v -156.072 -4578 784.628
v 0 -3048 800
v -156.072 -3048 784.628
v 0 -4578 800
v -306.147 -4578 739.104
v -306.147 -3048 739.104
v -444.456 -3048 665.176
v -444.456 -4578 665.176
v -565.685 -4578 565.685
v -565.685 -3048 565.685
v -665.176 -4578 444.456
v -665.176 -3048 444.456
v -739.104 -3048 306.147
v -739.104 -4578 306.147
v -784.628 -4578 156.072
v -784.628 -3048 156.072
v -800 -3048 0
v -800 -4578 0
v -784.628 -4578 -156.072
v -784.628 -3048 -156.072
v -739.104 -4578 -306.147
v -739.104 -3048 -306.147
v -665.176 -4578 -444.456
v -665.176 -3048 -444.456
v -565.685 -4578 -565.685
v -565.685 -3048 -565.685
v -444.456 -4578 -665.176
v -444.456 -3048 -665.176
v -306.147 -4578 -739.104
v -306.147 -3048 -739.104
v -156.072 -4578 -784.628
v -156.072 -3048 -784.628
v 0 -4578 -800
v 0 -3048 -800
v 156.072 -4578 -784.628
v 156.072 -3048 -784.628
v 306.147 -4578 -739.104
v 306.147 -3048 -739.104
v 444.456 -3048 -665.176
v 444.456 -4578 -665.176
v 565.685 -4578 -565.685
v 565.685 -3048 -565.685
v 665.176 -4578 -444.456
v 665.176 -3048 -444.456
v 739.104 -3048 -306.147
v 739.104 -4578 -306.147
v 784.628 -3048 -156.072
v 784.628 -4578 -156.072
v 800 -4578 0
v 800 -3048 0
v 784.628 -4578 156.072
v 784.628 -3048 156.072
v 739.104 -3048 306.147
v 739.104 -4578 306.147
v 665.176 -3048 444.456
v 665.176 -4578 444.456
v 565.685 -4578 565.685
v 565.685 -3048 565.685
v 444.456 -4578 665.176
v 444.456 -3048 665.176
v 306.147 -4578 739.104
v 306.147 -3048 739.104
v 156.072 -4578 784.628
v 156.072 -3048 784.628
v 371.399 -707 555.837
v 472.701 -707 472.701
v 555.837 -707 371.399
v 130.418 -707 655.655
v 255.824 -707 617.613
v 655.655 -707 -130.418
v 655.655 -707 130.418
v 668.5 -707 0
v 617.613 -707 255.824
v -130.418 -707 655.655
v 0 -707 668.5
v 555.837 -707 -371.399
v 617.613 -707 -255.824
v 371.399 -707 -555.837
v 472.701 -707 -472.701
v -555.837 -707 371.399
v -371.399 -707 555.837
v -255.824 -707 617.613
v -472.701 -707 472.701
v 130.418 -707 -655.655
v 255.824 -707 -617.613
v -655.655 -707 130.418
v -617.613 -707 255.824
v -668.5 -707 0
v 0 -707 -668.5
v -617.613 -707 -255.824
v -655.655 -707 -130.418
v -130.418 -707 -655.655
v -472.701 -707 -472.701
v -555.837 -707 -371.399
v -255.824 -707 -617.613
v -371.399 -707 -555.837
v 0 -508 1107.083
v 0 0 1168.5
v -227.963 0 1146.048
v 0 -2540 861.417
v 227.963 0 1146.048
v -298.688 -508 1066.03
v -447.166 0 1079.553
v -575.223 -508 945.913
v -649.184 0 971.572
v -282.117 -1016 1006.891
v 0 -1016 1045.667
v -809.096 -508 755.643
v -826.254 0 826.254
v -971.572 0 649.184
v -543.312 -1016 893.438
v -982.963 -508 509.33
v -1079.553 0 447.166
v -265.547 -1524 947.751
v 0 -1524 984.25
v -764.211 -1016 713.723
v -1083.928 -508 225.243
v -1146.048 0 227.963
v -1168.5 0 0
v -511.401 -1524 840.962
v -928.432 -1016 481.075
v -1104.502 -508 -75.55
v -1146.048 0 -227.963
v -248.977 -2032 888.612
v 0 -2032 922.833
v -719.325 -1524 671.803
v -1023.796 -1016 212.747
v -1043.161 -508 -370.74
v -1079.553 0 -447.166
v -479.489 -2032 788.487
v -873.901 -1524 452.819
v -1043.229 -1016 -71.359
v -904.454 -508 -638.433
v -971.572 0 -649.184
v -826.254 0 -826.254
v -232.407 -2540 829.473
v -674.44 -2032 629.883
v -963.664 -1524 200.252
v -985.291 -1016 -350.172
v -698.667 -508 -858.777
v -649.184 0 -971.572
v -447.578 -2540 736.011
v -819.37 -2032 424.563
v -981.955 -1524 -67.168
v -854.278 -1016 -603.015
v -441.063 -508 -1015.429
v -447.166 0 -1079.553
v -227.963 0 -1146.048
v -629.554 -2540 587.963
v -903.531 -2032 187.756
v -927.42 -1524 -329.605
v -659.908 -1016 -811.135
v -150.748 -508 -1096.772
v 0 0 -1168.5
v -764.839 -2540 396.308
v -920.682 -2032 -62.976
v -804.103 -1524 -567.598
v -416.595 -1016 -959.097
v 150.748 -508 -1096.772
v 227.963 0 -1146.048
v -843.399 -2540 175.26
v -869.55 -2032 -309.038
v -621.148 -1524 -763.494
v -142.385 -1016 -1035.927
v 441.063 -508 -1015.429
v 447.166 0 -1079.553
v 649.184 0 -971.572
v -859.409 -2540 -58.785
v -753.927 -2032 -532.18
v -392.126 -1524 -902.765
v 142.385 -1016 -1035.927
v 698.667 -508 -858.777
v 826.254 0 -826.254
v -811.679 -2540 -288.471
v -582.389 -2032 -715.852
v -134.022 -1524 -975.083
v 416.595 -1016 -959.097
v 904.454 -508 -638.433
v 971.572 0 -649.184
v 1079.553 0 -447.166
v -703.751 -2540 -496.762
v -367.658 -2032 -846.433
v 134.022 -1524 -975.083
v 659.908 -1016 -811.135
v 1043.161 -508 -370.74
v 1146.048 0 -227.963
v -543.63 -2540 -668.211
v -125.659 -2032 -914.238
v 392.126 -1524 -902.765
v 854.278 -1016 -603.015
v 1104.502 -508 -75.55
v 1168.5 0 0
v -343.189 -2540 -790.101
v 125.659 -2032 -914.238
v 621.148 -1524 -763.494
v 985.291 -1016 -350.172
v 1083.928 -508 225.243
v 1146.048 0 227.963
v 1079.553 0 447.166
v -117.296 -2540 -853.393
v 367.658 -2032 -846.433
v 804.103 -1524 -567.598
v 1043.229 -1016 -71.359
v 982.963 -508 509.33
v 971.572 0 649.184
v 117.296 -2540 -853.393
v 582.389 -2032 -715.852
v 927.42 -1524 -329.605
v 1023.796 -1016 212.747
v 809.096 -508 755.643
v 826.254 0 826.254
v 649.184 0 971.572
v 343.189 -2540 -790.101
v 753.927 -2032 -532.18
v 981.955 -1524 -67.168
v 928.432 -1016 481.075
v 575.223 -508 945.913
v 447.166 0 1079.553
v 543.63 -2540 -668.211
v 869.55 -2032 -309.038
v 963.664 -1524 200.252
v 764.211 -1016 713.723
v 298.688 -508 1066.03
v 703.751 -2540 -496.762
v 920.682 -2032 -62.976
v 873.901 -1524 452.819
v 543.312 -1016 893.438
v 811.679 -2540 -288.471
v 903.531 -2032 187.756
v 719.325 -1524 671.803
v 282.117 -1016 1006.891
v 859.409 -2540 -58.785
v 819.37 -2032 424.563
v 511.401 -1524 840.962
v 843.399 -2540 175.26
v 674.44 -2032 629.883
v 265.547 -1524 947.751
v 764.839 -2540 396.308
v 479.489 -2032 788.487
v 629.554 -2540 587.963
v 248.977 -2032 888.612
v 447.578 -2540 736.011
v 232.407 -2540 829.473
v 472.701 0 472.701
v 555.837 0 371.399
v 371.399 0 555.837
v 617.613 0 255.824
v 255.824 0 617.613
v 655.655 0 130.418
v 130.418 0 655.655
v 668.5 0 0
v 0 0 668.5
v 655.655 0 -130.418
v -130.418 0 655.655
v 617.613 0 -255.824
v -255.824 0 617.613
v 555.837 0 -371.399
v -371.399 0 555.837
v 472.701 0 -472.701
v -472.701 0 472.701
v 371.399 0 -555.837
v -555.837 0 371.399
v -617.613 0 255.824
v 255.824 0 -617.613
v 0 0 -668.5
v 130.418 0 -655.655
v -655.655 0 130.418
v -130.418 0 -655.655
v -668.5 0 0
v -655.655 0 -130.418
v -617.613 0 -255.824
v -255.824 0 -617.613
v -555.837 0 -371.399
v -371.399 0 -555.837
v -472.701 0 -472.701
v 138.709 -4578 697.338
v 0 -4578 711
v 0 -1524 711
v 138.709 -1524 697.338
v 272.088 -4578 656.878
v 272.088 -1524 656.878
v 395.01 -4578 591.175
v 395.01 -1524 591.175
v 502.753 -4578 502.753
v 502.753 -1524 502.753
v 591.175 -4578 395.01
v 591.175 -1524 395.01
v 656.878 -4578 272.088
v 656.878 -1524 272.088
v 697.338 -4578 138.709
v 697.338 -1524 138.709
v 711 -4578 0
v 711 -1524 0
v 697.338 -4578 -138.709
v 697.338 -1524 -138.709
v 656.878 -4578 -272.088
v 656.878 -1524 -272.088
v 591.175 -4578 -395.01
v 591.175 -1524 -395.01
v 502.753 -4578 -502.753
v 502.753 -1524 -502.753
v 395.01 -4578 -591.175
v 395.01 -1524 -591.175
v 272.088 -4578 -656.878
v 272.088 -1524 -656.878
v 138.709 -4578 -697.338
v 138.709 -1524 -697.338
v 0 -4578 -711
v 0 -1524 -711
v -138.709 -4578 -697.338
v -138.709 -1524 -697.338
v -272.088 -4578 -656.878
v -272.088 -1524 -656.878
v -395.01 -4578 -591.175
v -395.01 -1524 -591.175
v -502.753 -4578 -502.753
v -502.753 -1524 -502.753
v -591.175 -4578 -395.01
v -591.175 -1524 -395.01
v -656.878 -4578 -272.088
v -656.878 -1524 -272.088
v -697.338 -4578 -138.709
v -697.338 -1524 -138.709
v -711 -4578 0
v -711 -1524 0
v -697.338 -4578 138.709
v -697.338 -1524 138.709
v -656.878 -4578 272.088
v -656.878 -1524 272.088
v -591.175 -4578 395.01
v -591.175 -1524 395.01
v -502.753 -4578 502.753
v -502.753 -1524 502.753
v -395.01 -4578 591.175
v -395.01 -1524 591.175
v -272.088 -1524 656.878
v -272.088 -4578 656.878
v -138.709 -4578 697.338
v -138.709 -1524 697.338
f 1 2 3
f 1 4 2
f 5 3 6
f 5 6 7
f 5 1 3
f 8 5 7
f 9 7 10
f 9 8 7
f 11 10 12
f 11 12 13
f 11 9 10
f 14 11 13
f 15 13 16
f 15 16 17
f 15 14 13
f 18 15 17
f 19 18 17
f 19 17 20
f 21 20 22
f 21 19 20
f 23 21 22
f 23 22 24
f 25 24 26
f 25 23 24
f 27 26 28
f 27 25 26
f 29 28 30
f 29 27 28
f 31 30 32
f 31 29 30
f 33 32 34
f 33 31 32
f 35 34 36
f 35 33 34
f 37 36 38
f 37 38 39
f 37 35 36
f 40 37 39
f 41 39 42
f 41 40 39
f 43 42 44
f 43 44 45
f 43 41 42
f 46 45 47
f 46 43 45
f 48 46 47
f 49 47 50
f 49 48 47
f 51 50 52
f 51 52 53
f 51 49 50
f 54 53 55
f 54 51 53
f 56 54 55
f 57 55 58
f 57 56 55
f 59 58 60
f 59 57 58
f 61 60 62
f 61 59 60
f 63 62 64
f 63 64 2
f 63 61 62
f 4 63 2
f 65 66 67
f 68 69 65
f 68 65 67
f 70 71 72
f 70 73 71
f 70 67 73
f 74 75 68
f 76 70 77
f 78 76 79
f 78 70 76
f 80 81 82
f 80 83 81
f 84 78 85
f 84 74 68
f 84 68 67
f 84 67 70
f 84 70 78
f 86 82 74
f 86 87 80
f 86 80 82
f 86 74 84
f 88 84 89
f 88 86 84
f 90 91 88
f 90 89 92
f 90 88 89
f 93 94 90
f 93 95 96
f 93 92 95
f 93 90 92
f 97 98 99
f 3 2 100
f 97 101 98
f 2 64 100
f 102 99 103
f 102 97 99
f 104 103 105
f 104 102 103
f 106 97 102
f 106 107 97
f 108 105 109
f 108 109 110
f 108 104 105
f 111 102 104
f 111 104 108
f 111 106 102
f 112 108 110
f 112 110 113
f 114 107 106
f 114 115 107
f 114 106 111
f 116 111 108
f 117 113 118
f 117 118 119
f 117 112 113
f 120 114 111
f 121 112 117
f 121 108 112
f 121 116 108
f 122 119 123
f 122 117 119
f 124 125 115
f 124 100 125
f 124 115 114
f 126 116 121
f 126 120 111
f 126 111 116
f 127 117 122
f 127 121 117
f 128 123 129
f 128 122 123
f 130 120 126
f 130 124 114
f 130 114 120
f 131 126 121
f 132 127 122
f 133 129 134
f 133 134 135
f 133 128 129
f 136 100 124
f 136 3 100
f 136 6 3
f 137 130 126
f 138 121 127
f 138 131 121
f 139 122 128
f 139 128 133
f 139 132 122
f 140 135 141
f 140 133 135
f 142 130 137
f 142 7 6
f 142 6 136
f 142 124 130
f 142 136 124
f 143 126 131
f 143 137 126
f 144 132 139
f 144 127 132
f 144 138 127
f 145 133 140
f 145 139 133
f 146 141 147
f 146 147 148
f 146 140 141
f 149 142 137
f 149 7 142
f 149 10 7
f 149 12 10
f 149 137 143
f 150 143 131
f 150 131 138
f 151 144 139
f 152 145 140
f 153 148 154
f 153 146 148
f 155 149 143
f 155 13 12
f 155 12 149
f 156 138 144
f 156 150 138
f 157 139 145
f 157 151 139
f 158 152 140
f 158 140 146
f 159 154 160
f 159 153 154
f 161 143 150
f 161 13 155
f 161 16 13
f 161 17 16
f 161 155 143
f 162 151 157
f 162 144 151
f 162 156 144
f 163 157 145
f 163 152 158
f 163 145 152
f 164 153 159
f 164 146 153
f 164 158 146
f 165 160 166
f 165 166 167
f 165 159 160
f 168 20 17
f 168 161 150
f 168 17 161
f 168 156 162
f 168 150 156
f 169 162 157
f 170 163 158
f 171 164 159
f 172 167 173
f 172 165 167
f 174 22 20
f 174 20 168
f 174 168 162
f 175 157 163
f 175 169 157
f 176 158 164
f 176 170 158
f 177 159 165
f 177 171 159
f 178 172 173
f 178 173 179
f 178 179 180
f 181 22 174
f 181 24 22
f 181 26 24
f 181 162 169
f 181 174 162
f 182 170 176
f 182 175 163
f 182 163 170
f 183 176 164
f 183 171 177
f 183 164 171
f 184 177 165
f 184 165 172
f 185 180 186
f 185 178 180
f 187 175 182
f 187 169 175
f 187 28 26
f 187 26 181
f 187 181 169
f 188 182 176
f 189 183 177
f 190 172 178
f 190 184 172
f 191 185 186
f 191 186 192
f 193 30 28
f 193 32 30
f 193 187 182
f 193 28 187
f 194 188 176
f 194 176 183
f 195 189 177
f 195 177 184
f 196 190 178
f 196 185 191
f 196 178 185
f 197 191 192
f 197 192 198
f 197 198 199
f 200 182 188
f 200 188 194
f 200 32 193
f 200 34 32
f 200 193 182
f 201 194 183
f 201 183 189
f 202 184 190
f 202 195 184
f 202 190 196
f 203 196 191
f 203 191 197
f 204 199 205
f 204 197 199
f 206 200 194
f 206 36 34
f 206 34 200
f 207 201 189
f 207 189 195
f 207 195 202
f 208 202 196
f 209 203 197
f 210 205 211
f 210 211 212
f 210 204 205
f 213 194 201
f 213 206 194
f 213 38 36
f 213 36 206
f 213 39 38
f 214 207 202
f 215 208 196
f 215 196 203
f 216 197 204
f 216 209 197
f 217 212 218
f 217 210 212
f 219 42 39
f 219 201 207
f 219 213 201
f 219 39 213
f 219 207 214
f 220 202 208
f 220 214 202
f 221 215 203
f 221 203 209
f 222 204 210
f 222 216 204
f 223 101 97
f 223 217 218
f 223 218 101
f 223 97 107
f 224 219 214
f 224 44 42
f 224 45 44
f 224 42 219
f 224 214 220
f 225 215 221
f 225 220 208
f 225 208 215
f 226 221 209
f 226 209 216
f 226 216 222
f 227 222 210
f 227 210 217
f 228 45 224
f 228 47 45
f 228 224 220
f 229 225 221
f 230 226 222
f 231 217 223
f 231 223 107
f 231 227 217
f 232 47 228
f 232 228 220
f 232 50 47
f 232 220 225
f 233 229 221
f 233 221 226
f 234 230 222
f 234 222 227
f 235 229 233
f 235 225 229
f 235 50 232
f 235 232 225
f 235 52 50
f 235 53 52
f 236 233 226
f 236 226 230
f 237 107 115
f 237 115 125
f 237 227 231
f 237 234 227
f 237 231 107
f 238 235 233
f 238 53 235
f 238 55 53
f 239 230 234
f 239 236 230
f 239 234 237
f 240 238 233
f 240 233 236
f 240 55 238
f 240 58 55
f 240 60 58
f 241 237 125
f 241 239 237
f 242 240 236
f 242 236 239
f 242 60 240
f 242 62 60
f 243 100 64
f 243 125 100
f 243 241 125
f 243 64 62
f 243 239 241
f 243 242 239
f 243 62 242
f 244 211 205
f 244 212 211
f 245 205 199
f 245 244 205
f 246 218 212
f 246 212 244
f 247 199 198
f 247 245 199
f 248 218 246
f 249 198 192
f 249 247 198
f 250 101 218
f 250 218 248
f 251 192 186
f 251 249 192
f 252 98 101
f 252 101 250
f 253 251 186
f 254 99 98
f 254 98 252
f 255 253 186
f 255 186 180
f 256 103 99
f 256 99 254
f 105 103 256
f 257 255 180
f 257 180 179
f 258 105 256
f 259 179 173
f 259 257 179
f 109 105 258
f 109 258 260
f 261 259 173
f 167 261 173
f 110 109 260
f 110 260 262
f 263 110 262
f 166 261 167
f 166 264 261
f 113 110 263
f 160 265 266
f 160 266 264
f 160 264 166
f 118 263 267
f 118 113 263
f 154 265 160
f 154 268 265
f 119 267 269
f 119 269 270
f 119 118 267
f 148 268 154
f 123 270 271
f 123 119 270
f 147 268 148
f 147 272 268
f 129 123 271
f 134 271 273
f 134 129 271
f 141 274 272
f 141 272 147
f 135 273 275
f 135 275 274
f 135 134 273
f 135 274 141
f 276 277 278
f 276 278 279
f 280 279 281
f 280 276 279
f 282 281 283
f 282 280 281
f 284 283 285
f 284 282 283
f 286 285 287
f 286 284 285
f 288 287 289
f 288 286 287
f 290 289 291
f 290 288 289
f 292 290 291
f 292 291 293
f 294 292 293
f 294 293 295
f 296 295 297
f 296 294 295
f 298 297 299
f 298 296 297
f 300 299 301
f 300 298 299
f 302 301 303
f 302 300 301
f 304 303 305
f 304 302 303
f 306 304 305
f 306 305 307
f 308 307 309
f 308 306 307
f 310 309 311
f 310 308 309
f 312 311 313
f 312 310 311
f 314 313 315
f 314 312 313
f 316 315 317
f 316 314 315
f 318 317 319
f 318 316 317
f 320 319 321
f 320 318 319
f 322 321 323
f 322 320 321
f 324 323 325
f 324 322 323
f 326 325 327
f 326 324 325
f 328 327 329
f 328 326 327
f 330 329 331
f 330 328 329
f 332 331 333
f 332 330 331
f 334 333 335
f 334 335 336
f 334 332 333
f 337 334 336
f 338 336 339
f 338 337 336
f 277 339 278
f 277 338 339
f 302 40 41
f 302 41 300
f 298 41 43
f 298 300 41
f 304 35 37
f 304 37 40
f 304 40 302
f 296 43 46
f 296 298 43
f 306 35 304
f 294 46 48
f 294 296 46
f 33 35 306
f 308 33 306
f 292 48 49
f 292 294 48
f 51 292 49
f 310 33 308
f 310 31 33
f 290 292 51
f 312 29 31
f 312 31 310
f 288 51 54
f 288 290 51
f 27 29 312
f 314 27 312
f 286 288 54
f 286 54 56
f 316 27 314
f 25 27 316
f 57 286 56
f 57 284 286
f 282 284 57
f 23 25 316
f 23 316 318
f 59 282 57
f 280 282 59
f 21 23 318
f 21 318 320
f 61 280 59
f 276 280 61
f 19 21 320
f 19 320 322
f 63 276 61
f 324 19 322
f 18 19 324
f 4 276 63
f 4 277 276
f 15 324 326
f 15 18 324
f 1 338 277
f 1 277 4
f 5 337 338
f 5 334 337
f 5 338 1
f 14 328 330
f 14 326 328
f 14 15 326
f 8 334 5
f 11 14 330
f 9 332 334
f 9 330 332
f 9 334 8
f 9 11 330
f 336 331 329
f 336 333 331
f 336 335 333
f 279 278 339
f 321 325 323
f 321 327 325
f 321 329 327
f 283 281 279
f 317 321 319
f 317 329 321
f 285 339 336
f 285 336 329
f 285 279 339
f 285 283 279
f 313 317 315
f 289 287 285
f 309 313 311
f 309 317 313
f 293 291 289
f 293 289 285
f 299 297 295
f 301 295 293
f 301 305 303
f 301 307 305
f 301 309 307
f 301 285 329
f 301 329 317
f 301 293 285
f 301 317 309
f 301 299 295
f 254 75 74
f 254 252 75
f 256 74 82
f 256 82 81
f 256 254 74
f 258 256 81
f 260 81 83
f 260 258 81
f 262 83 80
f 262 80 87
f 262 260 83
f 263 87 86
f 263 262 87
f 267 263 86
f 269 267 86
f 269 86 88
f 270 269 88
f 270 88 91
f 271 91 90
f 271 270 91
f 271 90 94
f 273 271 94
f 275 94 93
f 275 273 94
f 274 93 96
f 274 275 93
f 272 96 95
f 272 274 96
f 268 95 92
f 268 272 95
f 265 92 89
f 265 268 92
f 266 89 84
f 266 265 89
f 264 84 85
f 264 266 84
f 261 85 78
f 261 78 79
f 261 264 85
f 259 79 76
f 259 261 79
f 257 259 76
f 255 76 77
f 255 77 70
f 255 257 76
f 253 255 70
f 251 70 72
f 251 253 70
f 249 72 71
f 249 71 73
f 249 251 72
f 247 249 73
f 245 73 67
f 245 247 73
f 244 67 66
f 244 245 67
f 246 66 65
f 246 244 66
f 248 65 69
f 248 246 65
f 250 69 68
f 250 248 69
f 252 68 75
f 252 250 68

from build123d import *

# Parameters (mm, degrees)
F2_W = 707
F2_H = 668.5


with BuildPart() as f3:
    # F0 (on Right) → F3 (revolve)
    with BuildSketch(Plane.YZ):
        Polygon((-3048, 0), (0, 0), (0, 1168.5), (-3048, 800), (-4578, 800), (-4578, 0), align=None)
    revolve(axis=Axis((0, -1524, 0), (0, -1, 0)))

    # F1 (on face) → F4 (revolve, cut)
    with BuildSketch(Plane.YZ):
        Polygon((-4810.84156, 0), (-3048, 0), (-1524, 0), (-1524, 711), (-3048, 711), (-4816.081524, 711), align=None)
    revolve(axis=Axis((0, -2286, 0), (0, 1, 0)), mode=Mode.SUBTRACT)

    # F2 (on Right) → F5 (revolve, cut)
    with BuildSketch(Plane.YZ):
        with Locations((-353.5, 334.25)):
            Rectangle(F2_W, F2_H)
    revolve(axis=Axis((0, -353.5, 0), (0, -1, 0)), mode=Mode.SUBTRACT)


solid = f3.part
